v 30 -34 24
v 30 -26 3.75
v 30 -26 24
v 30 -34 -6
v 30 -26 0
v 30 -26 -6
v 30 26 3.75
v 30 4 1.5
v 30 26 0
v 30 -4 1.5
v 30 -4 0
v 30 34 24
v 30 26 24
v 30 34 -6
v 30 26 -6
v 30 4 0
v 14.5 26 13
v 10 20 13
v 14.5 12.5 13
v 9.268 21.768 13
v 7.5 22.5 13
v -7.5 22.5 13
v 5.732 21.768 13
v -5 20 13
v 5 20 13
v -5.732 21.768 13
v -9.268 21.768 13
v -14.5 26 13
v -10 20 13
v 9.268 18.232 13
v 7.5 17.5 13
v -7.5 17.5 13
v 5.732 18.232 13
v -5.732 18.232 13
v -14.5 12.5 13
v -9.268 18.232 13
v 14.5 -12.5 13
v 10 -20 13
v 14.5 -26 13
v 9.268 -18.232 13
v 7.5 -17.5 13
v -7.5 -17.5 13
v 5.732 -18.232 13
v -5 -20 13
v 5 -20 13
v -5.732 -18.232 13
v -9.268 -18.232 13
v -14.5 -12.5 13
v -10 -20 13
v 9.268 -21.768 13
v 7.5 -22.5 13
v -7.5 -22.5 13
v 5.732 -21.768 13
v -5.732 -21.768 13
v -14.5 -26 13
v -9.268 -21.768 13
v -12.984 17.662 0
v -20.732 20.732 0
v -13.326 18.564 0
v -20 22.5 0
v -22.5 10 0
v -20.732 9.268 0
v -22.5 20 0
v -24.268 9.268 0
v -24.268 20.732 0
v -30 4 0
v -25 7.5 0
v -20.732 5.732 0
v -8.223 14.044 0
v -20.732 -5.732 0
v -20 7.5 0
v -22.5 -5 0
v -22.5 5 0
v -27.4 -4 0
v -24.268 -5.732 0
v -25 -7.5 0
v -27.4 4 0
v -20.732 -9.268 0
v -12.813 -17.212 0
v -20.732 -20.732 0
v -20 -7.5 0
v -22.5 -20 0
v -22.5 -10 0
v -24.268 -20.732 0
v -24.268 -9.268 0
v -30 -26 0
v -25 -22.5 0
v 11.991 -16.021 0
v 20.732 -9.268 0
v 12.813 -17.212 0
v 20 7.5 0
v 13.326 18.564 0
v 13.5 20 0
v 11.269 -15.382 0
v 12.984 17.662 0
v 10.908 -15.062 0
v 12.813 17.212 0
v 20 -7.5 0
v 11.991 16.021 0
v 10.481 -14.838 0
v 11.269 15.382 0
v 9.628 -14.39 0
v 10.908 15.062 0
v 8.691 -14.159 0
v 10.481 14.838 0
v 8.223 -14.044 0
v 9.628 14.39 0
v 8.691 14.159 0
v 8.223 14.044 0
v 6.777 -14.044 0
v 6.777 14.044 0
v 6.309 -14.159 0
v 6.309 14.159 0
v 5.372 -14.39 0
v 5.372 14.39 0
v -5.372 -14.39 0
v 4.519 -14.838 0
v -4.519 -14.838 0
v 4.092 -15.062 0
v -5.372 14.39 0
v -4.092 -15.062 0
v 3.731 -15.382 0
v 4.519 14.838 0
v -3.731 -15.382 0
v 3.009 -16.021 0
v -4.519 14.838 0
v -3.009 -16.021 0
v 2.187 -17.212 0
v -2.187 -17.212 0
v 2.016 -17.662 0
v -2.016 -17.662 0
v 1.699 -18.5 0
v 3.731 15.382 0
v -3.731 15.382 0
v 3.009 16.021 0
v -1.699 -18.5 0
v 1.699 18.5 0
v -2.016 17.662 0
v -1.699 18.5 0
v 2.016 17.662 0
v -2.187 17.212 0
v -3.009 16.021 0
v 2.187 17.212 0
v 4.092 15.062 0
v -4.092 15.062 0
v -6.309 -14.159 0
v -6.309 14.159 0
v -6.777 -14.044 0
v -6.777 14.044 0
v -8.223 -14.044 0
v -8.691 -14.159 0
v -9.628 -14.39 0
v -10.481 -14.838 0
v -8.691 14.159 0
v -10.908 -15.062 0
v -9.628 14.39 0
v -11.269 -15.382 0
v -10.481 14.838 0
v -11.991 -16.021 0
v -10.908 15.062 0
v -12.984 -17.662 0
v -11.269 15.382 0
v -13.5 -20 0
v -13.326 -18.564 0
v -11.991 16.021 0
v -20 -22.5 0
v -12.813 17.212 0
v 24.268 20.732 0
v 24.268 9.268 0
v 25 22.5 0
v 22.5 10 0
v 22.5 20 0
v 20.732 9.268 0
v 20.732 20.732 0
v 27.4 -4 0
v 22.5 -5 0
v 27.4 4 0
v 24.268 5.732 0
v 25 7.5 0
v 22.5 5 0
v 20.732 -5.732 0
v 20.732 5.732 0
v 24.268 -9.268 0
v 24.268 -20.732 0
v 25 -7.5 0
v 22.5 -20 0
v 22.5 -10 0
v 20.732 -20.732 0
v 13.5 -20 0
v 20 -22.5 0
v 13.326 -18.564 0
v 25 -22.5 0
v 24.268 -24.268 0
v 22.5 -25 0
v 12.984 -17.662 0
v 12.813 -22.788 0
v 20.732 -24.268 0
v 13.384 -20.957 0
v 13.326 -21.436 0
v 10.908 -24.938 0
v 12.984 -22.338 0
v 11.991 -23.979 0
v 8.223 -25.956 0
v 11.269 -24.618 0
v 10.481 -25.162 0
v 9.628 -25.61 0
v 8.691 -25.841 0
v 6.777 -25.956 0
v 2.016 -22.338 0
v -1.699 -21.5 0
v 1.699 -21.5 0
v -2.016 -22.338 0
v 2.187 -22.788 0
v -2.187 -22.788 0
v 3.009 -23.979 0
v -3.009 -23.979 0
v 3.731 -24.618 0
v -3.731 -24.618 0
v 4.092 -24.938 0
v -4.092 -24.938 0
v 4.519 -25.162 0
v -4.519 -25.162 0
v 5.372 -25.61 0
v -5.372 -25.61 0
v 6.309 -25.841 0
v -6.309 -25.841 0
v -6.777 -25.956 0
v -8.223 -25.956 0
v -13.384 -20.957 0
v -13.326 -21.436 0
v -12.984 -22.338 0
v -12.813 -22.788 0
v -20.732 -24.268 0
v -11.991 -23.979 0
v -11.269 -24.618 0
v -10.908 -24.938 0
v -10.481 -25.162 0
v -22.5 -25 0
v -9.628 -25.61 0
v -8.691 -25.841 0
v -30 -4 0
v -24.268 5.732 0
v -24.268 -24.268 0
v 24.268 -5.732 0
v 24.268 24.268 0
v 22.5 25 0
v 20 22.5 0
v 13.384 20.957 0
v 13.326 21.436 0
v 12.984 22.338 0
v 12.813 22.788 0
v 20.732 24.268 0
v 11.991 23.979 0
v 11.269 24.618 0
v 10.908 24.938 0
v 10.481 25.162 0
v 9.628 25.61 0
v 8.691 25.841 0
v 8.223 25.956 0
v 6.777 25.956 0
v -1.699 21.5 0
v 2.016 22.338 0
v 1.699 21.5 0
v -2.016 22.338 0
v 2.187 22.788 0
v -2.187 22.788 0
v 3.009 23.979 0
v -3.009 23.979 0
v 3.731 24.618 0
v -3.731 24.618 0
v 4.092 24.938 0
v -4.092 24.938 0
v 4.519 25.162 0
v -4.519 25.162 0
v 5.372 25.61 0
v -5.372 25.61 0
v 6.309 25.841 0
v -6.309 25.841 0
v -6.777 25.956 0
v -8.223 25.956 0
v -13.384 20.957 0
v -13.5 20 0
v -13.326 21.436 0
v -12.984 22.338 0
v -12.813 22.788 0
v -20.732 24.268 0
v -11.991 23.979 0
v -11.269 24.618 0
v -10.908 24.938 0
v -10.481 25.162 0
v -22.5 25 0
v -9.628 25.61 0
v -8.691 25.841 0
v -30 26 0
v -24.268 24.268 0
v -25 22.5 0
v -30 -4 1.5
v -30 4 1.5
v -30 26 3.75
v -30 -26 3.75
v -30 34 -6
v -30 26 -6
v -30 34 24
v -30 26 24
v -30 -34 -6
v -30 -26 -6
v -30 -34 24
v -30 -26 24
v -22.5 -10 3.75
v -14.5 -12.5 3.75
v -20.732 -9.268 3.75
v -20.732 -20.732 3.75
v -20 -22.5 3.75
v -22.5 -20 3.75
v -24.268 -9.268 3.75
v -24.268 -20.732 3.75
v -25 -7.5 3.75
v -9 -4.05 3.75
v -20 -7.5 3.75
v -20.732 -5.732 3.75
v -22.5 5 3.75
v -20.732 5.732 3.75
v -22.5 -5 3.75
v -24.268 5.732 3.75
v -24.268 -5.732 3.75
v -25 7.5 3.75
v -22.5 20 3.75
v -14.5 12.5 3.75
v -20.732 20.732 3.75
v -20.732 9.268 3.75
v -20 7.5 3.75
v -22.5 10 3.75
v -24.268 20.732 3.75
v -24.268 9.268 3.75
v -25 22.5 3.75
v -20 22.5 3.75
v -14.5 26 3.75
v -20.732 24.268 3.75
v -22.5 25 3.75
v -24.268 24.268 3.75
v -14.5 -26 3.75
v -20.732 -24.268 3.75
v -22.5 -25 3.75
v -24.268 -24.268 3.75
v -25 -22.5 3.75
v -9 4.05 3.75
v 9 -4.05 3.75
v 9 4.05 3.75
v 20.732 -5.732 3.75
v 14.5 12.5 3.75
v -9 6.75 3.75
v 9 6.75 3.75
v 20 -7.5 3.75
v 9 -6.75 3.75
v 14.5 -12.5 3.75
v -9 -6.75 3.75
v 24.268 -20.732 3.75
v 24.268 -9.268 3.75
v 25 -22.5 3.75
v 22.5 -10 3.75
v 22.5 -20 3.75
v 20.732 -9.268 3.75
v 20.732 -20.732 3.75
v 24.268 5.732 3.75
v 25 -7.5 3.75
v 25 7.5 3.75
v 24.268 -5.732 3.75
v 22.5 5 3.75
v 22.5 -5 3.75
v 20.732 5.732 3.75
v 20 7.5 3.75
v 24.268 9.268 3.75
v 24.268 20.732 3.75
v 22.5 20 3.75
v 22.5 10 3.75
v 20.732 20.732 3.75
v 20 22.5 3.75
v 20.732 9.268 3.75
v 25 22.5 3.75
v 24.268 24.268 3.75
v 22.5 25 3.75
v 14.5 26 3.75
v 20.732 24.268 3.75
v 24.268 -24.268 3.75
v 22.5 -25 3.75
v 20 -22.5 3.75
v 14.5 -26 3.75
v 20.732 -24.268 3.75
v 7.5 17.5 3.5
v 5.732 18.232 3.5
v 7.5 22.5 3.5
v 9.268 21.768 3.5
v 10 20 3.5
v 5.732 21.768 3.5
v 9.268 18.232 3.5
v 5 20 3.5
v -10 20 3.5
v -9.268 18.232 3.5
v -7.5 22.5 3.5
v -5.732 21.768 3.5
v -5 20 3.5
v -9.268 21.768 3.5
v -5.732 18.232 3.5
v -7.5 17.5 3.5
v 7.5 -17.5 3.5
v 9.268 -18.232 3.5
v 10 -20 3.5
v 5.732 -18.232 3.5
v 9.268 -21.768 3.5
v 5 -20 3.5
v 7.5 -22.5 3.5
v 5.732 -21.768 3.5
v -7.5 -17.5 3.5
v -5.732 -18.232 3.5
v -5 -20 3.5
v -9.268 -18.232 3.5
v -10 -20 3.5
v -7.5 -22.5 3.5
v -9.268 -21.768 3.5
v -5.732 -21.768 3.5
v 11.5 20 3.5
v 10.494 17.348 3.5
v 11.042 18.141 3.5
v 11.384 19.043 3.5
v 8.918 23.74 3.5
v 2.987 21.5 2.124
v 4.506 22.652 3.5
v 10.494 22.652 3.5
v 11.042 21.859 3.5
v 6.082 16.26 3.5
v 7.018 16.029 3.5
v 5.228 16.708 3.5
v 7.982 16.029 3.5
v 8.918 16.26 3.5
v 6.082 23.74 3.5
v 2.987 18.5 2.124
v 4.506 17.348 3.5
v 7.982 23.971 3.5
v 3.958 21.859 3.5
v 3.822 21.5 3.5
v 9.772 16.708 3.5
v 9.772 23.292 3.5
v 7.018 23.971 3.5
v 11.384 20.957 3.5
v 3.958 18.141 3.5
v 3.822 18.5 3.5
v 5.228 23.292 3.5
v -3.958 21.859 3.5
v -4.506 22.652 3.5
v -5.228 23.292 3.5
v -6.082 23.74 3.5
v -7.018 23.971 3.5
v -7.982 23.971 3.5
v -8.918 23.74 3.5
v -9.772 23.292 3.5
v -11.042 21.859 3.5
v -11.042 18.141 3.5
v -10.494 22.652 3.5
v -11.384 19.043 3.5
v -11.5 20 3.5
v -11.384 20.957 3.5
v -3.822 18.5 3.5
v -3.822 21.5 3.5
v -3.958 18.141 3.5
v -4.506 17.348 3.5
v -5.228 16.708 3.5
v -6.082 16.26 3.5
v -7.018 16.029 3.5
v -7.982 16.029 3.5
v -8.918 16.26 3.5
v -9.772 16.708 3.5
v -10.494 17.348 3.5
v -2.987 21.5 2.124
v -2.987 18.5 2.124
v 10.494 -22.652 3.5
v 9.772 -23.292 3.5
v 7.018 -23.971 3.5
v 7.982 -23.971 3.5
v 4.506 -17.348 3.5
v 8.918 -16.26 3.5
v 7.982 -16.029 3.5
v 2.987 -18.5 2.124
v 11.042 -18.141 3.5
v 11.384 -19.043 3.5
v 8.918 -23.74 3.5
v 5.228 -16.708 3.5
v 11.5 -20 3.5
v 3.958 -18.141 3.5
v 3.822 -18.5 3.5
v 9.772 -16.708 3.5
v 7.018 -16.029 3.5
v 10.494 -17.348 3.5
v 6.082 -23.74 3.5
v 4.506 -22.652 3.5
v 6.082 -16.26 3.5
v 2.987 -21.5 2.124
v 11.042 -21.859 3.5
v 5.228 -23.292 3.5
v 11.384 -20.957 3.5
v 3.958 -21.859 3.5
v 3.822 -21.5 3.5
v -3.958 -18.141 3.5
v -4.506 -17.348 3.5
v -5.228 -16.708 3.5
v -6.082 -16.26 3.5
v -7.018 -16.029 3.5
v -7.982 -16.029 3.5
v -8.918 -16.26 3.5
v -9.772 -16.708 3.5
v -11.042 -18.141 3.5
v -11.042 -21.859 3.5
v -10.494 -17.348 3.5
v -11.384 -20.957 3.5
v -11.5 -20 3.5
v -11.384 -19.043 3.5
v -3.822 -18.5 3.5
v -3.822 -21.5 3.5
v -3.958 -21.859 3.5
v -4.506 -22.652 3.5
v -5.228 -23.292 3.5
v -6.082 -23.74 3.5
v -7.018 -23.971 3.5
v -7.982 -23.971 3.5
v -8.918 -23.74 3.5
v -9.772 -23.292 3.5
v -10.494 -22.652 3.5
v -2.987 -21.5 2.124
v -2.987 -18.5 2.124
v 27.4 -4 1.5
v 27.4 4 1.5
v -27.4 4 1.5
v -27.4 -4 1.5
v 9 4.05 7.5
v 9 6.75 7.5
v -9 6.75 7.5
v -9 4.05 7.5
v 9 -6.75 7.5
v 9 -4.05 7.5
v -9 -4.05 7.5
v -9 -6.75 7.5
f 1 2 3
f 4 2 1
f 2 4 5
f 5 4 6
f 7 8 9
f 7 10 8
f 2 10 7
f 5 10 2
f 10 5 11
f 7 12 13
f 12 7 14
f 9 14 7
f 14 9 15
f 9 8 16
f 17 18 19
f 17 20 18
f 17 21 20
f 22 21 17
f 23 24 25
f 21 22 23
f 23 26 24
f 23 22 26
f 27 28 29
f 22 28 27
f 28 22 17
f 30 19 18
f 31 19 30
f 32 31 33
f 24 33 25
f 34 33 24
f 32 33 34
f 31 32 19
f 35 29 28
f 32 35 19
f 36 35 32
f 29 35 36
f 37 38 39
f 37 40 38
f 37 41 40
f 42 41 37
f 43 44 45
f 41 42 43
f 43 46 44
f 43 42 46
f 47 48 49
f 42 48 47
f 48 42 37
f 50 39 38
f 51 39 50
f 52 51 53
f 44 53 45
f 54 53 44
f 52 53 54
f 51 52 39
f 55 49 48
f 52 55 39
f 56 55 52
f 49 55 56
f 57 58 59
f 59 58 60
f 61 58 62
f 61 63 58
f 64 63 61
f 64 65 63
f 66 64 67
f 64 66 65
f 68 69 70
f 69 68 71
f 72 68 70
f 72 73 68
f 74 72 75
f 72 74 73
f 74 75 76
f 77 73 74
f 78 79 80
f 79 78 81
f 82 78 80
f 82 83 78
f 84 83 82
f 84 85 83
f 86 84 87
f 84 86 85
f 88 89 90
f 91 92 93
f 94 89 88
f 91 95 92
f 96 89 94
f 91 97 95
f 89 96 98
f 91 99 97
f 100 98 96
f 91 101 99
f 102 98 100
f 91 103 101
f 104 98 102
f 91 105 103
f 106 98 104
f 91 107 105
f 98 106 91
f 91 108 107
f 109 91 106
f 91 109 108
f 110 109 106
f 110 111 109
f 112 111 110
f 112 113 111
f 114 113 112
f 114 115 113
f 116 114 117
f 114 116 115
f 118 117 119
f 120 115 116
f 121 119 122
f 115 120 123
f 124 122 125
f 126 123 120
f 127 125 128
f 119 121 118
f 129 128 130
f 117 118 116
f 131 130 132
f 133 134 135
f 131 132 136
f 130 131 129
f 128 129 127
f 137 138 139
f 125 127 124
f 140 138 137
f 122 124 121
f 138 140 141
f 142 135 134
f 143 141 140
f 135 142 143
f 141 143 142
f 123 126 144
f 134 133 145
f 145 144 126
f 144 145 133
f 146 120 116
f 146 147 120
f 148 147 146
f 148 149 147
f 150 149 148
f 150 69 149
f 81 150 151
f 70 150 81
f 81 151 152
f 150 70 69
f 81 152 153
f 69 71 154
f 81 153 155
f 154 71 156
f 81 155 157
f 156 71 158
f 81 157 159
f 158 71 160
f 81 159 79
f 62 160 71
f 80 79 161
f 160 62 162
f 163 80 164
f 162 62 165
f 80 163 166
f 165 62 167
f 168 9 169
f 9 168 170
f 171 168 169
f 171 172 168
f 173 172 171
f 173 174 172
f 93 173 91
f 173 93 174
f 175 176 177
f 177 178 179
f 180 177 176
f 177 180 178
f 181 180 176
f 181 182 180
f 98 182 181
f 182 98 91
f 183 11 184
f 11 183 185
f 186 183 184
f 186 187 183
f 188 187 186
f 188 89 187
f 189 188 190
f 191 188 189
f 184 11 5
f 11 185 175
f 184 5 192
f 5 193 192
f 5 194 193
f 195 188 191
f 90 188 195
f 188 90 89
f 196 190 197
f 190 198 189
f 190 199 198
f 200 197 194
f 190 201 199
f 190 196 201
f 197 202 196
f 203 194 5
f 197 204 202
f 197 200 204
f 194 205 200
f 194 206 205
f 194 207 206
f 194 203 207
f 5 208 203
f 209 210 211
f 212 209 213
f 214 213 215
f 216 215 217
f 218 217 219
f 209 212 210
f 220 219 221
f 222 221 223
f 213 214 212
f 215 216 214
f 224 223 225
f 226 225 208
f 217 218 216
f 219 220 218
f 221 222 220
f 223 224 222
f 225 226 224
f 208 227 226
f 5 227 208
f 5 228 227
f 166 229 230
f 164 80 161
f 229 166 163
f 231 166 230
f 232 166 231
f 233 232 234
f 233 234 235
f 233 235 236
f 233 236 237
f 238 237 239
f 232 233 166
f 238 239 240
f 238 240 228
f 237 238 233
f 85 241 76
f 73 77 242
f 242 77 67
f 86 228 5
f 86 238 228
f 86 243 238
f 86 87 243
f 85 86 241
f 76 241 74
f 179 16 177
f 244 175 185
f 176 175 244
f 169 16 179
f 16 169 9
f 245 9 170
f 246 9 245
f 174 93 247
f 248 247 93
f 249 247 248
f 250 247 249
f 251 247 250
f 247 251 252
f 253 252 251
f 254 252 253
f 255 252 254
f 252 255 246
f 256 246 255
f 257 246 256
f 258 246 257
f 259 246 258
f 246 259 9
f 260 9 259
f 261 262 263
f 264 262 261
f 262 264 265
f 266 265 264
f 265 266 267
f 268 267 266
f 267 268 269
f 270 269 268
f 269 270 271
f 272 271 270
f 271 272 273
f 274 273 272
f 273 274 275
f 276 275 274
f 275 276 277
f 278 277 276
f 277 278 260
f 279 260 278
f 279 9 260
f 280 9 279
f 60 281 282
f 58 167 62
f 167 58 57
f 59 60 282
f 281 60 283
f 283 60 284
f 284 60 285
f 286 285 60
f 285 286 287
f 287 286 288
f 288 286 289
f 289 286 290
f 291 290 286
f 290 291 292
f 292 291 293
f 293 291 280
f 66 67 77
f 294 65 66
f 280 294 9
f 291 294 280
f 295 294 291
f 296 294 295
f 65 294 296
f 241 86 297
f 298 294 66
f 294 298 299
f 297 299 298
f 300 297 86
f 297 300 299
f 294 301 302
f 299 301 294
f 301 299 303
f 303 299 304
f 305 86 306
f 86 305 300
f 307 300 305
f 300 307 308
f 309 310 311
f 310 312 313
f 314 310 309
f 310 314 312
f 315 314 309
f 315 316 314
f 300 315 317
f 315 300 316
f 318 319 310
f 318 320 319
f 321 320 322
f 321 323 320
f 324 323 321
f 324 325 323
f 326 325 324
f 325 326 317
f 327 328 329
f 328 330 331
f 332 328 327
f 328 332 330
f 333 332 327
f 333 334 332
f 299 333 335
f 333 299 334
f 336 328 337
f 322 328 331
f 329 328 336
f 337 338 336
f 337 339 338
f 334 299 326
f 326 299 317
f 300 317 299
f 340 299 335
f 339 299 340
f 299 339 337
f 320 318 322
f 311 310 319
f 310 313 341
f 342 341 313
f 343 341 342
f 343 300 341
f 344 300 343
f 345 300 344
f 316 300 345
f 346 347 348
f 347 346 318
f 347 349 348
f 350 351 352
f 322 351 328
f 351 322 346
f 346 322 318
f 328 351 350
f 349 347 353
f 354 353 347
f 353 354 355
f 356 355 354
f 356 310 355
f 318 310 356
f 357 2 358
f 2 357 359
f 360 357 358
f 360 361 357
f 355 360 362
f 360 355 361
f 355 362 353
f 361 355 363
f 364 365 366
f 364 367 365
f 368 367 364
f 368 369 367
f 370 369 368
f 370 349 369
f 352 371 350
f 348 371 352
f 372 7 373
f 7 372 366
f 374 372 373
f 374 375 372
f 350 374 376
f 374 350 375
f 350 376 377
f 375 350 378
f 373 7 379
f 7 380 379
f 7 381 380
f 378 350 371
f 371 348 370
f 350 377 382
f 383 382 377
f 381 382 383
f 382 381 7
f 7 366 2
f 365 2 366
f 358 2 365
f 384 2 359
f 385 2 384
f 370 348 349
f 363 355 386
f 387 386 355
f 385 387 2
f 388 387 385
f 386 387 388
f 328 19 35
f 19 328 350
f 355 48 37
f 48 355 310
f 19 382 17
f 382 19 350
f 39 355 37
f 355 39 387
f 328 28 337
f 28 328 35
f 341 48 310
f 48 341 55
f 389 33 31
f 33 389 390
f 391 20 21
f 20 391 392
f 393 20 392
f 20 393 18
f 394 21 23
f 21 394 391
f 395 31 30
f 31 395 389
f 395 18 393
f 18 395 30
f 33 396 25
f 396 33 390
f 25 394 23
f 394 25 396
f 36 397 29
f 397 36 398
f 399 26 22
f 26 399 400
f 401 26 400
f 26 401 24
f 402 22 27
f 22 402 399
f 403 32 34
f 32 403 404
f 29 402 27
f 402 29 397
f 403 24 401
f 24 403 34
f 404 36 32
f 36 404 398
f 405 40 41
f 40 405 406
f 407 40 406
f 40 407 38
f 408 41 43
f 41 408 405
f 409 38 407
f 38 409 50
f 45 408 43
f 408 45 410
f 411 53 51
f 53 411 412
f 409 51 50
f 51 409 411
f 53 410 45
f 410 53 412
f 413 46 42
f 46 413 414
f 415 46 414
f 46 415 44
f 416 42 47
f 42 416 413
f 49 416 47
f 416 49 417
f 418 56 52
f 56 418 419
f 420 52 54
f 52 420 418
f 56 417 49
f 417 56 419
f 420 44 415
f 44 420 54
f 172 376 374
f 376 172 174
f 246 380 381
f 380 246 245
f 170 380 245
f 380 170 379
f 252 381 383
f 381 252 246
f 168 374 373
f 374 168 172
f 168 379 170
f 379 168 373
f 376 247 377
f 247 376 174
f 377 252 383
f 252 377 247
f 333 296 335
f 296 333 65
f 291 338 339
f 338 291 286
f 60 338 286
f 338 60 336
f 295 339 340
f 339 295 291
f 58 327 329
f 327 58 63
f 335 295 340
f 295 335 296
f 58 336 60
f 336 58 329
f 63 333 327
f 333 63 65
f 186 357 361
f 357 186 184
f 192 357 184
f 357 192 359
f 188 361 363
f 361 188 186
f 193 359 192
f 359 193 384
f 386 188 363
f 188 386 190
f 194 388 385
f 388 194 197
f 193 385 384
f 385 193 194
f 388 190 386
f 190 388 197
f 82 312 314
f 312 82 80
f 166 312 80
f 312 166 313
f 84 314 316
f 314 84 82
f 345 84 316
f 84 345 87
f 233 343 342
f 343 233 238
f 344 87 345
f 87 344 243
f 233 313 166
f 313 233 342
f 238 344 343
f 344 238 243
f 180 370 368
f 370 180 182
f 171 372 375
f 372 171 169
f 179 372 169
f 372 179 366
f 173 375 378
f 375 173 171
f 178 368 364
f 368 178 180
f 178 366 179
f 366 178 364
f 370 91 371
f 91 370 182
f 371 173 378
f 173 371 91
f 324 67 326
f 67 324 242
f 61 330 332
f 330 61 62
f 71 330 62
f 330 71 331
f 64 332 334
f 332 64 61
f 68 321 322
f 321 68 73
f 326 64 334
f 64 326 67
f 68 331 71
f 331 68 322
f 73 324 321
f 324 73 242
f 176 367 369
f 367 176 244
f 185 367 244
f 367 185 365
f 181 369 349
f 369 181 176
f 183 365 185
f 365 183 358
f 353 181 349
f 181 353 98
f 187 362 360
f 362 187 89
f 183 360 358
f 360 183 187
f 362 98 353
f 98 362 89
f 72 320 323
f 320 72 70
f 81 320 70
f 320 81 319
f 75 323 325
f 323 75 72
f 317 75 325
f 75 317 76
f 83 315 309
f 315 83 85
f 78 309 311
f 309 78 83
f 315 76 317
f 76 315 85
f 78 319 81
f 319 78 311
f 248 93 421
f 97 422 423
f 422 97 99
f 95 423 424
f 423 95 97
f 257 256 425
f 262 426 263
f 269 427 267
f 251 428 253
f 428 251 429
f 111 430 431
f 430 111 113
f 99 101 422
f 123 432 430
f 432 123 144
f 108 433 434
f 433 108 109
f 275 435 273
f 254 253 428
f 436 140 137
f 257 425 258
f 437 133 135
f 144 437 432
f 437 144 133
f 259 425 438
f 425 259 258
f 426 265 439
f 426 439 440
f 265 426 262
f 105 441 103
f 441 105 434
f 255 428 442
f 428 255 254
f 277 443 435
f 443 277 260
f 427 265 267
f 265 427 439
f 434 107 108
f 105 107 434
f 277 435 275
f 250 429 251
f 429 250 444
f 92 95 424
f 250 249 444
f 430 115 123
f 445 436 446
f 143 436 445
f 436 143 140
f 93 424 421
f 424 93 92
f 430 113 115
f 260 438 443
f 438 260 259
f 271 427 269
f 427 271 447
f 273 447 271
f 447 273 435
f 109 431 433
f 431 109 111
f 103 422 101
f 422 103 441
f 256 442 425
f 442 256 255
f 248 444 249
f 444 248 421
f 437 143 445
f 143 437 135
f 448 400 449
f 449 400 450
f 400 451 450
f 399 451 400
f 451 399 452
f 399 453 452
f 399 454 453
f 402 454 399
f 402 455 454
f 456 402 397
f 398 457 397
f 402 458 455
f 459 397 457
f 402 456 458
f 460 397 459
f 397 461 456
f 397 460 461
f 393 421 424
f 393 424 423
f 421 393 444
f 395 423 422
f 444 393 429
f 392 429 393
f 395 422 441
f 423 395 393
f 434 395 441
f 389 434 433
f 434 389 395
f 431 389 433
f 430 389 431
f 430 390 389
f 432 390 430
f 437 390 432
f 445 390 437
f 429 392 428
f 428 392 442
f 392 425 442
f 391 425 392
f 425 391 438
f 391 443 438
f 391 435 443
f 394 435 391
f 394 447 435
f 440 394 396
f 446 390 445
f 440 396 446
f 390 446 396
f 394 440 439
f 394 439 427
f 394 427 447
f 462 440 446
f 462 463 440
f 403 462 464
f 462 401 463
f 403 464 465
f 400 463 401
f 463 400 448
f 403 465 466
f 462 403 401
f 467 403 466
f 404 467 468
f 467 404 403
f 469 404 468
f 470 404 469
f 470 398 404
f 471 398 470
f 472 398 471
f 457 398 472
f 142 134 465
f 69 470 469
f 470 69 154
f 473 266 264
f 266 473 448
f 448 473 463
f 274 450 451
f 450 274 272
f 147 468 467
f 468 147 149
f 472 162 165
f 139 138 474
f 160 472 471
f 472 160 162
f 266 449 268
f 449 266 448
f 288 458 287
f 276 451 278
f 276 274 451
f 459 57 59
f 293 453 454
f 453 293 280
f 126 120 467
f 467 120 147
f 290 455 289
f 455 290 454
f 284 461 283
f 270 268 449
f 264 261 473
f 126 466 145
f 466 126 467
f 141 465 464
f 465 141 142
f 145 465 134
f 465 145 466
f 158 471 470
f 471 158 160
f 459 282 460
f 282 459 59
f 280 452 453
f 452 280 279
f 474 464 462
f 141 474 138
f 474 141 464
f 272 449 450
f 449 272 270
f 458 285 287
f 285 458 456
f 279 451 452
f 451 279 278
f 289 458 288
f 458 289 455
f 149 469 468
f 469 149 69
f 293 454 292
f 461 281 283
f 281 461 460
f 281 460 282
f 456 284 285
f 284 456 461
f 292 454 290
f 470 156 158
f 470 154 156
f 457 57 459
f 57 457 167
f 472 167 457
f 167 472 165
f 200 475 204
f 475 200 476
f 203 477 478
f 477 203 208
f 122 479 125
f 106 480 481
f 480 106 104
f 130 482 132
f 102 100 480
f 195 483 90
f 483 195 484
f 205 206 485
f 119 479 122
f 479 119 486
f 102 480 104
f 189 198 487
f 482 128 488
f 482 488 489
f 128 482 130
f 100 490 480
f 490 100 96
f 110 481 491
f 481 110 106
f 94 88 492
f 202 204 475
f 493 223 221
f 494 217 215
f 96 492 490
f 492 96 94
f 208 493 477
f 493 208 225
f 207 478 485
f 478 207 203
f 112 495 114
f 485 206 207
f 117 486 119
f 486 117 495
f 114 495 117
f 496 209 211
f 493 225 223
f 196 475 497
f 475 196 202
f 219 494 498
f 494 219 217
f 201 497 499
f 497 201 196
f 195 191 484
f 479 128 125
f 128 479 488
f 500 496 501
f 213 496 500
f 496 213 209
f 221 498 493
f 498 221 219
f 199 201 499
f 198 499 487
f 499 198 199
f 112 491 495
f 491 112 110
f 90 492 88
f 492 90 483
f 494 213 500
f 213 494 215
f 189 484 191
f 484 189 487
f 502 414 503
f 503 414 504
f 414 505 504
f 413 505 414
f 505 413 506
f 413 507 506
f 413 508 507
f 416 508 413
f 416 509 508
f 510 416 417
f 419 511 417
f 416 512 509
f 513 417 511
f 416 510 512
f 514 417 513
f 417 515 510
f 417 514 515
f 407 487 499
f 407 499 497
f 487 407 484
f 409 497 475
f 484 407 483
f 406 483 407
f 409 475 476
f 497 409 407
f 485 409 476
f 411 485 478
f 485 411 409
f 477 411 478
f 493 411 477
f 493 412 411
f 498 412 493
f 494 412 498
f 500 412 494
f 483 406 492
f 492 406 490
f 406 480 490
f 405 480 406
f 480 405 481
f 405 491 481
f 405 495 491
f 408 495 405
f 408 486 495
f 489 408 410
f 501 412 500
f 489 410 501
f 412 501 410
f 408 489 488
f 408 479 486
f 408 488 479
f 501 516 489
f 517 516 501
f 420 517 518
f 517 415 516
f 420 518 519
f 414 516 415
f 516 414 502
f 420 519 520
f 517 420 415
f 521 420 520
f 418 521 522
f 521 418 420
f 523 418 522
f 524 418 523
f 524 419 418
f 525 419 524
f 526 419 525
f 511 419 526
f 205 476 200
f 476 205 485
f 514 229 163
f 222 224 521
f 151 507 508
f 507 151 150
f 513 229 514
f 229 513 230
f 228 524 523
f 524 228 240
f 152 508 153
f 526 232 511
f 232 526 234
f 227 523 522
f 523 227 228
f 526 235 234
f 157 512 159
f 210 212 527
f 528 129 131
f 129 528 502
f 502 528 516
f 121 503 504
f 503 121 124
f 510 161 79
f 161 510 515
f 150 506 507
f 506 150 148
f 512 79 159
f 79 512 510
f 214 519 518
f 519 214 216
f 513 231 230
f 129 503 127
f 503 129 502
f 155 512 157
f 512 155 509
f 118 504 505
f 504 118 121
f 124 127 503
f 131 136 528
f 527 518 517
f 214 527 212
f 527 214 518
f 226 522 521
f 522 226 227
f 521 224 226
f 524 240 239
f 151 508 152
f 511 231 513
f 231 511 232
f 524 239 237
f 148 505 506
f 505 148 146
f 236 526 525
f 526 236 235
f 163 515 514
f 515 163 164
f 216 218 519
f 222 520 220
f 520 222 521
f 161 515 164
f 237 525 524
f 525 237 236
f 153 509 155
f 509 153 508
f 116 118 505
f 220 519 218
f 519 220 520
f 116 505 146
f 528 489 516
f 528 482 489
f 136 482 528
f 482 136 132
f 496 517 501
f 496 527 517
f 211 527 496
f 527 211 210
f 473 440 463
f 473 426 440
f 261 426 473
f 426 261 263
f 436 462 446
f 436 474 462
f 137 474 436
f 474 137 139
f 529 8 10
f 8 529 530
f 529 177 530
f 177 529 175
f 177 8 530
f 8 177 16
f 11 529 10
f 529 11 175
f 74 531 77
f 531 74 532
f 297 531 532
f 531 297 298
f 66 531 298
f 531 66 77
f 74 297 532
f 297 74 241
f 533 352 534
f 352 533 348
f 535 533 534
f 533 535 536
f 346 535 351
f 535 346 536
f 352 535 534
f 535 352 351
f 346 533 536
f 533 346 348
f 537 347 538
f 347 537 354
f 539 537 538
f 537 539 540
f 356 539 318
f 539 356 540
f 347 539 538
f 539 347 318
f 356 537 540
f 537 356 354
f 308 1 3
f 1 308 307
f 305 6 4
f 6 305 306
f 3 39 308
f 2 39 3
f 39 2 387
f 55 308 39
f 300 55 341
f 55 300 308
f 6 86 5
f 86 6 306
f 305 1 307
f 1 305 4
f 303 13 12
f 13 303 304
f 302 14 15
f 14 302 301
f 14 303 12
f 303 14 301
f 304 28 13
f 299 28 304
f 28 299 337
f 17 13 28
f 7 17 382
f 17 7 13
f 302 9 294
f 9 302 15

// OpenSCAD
//block shape
x=60;
y=60;
z=13;

// track channel
f=x+10;
g=25;
h=9.5;
// block top
e=20;
r=y+10;
t=16.5;

// spacing of screw holes
cx=15;
cy=40;
dx=15;
dy=45;


difference()
{
    translate([0,0,z]/2) cube ([x,y,z],center=true);
    translate([0,0,z+4]/2) cube([f,g,h],center=true);
    translate([49,0,z+11]/2) cube ([e,r,t],center=true);
        translate([-49,0,z+11]/2) cube ([e,r,t],center=true);

  translate([cx,cy,0]/2) cylinder(d=5, h=50,  center=true);
  translate([-cx,cy,0]/2) cylinder(d=5, h=50,  center=true);
    translate([cx,-cy,0]/2) cylinder(d=5, h=50,  center=true);
    translate([-cx,-cy,0]/2) cylinder(d=5, h=50,  center=true);
  translate([dy,dy,0]/2) cylinder(d=5, h=50,  center=true);
  translate([-dy,dy,0]/2) cylinder(d=5, h=50,  center=true);
    translate([dy,-dy,0]/2) cylinder(d=5, h=50,  center=true);
    translate([-dy,-dy,0]/2) cylinder(d=5, h=50,  center=true);  
    translate([dy,dx,0]/2) cylinder(d=5, h=50,  center=true);
  translate([-dy,dx,0]/2) cylinder(d=5, h=50,  center=true);  
  translate([dy,-dx,0]/2) cylinder(d=5, h=50,  center=true);
  translate([-dy,-dx,0]/2) cylinder(d=5, h=50,  center=true);  
    
 translate([cx,cy,0]/2)  cylinder(d1=16, d2=8, h=7,  center=true);
 translate([-cx,cy,0]/2) cylinder(d1=16, d2=8, h=7, center=true);
    translate([cx,-cy,0]/2) cylinder(d1=16, d2=8, h=7,  center=true);
    translate([-cx,-cy,0]/2) cylinder(d1=16, d2=8, h=7,  center=true);    
// zip tie knotches    
    translate([0,-cy/2,11.5-10]) cube([18,3,4],center=true);
    translate([0,cy/2,11.5-10]) cube([18,3,4],center=true);
// removal knotches
       translate([0,-(6.8+51)/2,11.5-10]) cube([8,3,4],center=true);
   translate([0,(6.8+51)/2,11.5-10]) cube([8,3,4],center=true);
   translate([(6.8+51)/2,0,11.5-11]) cube([3,8,2],center=true);
   translate([-(6.8+51)/2,0,11.5-11]) cube([3,8,2],center=true);
}

translate([0,(6.8+4)/2,z-8]) cube([18,2.7,5],center=true);
translate([0,-(6.8+4)/2,z-8]) cube([18,2.7,5],center=true);

difference ()
{
    translate([0,-30,9]) cube([60,8,30],center=true);
    
    
}

difference ()
{
    translate([0,30,9]) cube([60,8,30],center=true);
    
    
}
